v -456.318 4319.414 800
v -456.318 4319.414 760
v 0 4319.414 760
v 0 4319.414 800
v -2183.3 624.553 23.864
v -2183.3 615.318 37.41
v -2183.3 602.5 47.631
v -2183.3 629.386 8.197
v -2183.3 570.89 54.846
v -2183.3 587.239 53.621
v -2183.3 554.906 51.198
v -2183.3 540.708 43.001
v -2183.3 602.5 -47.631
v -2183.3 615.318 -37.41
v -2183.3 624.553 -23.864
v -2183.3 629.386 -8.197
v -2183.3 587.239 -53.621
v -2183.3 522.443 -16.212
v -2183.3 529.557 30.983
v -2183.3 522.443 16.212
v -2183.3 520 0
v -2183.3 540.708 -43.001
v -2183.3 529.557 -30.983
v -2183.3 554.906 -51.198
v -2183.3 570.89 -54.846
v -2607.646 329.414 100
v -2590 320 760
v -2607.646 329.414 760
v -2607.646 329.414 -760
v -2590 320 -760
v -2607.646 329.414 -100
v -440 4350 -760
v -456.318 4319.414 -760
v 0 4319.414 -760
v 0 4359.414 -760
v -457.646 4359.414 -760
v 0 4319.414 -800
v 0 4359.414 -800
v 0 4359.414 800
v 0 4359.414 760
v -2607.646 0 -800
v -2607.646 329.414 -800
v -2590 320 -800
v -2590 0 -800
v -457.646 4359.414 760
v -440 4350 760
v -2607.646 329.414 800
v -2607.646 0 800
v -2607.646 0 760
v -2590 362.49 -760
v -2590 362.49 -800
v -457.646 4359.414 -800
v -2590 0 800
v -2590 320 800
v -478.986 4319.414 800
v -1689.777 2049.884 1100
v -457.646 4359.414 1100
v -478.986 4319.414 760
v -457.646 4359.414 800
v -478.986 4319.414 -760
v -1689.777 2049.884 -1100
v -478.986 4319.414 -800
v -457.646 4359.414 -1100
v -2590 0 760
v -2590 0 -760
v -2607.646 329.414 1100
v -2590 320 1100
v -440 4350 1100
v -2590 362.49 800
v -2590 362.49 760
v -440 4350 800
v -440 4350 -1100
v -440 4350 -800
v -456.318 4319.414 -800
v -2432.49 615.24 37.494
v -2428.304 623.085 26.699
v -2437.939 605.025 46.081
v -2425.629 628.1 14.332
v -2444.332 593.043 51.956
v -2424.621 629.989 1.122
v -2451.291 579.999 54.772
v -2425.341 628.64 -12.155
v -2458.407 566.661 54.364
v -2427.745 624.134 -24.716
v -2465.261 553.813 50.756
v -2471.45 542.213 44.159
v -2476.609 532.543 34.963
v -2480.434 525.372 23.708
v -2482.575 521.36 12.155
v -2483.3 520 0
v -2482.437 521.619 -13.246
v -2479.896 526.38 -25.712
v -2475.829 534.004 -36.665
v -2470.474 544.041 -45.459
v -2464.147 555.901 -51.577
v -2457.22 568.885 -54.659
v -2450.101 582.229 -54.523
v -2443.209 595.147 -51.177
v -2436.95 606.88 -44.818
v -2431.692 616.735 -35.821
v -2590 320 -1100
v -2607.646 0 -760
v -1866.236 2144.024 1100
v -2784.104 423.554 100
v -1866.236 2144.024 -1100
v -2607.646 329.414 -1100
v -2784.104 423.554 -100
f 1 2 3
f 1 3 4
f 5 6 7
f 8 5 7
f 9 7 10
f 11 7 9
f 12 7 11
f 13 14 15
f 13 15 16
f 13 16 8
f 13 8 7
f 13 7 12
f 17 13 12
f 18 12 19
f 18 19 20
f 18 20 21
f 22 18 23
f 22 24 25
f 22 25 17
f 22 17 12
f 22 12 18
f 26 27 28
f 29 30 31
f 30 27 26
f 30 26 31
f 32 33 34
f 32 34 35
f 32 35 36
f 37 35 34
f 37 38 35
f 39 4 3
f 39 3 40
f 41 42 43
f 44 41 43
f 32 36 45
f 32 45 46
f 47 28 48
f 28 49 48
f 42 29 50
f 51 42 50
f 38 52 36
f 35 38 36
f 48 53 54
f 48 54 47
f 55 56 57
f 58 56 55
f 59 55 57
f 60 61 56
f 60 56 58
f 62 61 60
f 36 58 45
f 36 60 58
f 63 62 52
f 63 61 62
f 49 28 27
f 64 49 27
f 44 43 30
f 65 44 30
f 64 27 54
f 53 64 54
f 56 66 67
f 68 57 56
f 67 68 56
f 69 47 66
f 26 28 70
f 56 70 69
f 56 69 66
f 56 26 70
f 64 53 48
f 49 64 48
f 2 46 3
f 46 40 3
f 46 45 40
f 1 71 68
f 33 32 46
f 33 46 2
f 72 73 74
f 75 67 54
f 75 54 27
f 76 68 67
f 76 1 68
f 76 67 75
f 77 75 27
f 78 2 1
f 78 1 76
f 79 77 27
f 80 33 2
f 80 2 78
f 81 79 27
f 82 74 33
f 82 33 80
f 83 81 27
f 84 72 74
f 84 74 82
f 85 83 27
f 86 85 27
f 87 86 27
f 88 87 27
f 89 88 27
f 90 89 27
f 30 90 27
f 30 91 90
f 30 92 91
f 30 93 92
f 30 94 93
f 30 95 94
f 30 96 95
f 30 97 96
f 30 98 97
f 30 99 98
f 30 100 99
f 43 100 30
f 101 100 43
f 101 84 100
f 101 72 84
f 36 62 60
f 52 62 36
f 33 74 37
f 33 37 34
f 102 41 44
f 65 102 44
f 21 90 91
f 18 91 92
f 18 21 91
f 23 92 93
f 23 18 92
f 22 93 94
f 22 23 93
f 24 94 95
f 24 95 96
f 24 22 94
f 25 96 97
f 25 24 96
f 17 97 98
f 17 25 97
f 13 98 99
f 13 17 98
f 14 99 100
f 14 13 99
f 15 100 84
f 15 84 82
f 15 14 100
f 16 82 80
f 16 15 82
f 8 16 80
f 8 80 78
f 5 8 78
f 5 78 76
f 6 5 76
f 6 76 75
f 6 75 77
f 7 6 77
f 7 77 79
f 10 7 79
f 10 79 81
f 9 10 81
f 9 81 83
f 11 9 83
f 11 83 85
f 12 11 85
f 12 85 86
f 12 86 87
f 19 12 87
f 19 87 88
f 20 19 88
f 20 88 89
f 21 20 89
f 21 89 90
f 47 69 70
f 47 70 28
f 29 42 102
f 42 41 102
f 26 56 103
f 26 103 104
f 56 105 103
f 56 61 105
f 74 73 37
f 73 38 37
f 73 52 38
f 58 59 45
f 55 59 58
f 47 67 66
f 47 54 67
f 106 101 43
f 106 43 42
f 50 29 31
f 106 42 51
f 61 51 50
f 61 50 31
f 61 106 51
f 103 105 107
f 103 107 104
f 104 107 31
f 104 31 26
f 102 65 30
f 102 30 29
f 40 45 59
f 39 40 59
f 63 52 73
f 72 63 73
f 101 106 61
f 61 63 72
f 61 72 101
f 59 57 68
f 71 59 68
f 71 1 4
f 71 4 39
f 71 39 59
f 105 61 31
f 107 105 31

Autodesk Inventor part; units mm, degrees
ref_plane "YZ Plane" through (0, 0, 0) normal (1, 0, 0) x (0, 1, 0)
ref_plane "XZ Plane" through (0, 0, 0) normal (0, 1, 0) x (-1, 0, 0)
ref_plane "XY Plane" through (0, 0, 0) normal (0, 0, 1) x (1, 0, 0)
sketch "Sketch1" plane through (0, 0, 0) normal (0, 0, 1) x (1, 0, 0)
  line L0 (-440, 0) -> (-440, 4350)
  line L1 (-440, 4350) -> (-2590, 320)
  line L2 (-2590, 320) -> (-2590, 0)
  line L3 (-2590, 0) -> (-440, 0)
  line L4 (-2590, 320) -> (-2607.6458, 329.414)
  line L5 (-2607.6458, 329.414) -> (-457.6458, 4359.414)
  line L6 (-457.6458, 4359.414) -> (-440, 4350)
  point P0 (0, 0)
  dimension "d0" = 4350
  dimension "d1" = 2150
  dimension "d2" = 320
  dimension "d3" = 61.92
  dimension "d4" = 440
  dimension "d5" = 20
extrude "Extrusion1" add sketch "Sketch1" along normal mid plane 2200 contours L1 L4 L5 L6
sketch "Sketch2" plane through (-2607.6458, 329.414, -1100) normal (-0.8822923, 0.4707019, 0) x (0, 0, 1)
  line L0 (0, 0) -> (0, 4567.6471) projected
  line L1 (0, 0) -> (2200, 0) projected
  line L2 (2200, 4567.6471) -> (2200, 0) projected
  line L3 (0, 4567.6471) -> (2200, 4567.6471) projected
  line L4 (0, 1950) -> (1000, 0)
  line L5 (2200, 1950) -> (1200, 0)
  line L6 (0, 1950) -> (2200, 1950)
  point P0 (1100, 936.7843)
  dimension "d8" = 1950
  dimension "d9" = 200
extrude "Extrusion2" add sketch "Sketch2" along normal blind 200 contours L6 L5 L1 L4
sketch "Sketch3" plane through (0, 0, 0) normal (0, 0, 1) x (1, 0, 0)
  line L0 (-2590, 320) -> (-440, 4350) construction
  line L1 (-2483.3002, 575) -> (-2183.3002, 575)
  line L2 (-2483.3002, 575) -> (-2483.3002, 520)
  line L3 (-2483.3002, 520) -> (-2183.3002, 520)
  line L4 (-2183.3002, 520) -> (-2183.3002, 575)
  point P0 (0, 0)
  dimension "d12" = 300
  dimension "d13" = 200
  dimension "d14" = 110
revolve "Revolution1" add sketch "Sketch3" angle 360 about axis through (-2483.3002, 575, 0) along (1, 0, 0)
sketch "Sketch4" plane through (0, 0, 0) normal (0, 1, 0) x (-1, 0, 0)
  line L0 (2607.6458, 100) -> (2607.6458, 1100) projected
  line L1 (2590, -1100) -> (2590, 1100) projected
  line L2 (2590, 800) -> (2607.6458, 800)
  line L3 (2607.6458, 800) -> (2607.6458, 760)
  line L4 (2607.6458, 760) -> (2590, 760)
  line L5 (2590, 760) -> (2590, 800)
  point P0 (0, 0)
  dimension "d16" = 40
  dimension "d17" = 300
extrude "Extrusion3" add sketch "Sketch4" along normal up to surface surface through (-457.6458, 4359.414, 0) normal (-0.8822923, 0.4707019, 0)
sketch "Sketch5" plane through (0, 0, 0) normal (1, 0, 0) x (0, 1, 0)
  line L0 (4359.414, -1100) -> (4359.414, 1100) projected
  line L1 (4359.414, 760) -> (4319.414, 760)
  line L2 (4319.414, 760) -> (4319.414, 800)
  line L3 (4319.414, 800) -> (4359.414, 800)
  line L4 (4359.414, 800) -> (4359.414, 760)
  point P0 (0, 0)
  dimension "d20" = 40
  dimension "d24" = 300
extrude "Extrusion4" add sketch "Sketch5" against normal up to surface surface through (-457.6458, 4359.414, 0) normal (-0.8822923, 0.4707019, 0)
mirror "Mirror2" about plane through (0, 0, 0) normal (0, 0, 1) of "Extrusion3", "Extrusion4"
properties part number "Pocket"
